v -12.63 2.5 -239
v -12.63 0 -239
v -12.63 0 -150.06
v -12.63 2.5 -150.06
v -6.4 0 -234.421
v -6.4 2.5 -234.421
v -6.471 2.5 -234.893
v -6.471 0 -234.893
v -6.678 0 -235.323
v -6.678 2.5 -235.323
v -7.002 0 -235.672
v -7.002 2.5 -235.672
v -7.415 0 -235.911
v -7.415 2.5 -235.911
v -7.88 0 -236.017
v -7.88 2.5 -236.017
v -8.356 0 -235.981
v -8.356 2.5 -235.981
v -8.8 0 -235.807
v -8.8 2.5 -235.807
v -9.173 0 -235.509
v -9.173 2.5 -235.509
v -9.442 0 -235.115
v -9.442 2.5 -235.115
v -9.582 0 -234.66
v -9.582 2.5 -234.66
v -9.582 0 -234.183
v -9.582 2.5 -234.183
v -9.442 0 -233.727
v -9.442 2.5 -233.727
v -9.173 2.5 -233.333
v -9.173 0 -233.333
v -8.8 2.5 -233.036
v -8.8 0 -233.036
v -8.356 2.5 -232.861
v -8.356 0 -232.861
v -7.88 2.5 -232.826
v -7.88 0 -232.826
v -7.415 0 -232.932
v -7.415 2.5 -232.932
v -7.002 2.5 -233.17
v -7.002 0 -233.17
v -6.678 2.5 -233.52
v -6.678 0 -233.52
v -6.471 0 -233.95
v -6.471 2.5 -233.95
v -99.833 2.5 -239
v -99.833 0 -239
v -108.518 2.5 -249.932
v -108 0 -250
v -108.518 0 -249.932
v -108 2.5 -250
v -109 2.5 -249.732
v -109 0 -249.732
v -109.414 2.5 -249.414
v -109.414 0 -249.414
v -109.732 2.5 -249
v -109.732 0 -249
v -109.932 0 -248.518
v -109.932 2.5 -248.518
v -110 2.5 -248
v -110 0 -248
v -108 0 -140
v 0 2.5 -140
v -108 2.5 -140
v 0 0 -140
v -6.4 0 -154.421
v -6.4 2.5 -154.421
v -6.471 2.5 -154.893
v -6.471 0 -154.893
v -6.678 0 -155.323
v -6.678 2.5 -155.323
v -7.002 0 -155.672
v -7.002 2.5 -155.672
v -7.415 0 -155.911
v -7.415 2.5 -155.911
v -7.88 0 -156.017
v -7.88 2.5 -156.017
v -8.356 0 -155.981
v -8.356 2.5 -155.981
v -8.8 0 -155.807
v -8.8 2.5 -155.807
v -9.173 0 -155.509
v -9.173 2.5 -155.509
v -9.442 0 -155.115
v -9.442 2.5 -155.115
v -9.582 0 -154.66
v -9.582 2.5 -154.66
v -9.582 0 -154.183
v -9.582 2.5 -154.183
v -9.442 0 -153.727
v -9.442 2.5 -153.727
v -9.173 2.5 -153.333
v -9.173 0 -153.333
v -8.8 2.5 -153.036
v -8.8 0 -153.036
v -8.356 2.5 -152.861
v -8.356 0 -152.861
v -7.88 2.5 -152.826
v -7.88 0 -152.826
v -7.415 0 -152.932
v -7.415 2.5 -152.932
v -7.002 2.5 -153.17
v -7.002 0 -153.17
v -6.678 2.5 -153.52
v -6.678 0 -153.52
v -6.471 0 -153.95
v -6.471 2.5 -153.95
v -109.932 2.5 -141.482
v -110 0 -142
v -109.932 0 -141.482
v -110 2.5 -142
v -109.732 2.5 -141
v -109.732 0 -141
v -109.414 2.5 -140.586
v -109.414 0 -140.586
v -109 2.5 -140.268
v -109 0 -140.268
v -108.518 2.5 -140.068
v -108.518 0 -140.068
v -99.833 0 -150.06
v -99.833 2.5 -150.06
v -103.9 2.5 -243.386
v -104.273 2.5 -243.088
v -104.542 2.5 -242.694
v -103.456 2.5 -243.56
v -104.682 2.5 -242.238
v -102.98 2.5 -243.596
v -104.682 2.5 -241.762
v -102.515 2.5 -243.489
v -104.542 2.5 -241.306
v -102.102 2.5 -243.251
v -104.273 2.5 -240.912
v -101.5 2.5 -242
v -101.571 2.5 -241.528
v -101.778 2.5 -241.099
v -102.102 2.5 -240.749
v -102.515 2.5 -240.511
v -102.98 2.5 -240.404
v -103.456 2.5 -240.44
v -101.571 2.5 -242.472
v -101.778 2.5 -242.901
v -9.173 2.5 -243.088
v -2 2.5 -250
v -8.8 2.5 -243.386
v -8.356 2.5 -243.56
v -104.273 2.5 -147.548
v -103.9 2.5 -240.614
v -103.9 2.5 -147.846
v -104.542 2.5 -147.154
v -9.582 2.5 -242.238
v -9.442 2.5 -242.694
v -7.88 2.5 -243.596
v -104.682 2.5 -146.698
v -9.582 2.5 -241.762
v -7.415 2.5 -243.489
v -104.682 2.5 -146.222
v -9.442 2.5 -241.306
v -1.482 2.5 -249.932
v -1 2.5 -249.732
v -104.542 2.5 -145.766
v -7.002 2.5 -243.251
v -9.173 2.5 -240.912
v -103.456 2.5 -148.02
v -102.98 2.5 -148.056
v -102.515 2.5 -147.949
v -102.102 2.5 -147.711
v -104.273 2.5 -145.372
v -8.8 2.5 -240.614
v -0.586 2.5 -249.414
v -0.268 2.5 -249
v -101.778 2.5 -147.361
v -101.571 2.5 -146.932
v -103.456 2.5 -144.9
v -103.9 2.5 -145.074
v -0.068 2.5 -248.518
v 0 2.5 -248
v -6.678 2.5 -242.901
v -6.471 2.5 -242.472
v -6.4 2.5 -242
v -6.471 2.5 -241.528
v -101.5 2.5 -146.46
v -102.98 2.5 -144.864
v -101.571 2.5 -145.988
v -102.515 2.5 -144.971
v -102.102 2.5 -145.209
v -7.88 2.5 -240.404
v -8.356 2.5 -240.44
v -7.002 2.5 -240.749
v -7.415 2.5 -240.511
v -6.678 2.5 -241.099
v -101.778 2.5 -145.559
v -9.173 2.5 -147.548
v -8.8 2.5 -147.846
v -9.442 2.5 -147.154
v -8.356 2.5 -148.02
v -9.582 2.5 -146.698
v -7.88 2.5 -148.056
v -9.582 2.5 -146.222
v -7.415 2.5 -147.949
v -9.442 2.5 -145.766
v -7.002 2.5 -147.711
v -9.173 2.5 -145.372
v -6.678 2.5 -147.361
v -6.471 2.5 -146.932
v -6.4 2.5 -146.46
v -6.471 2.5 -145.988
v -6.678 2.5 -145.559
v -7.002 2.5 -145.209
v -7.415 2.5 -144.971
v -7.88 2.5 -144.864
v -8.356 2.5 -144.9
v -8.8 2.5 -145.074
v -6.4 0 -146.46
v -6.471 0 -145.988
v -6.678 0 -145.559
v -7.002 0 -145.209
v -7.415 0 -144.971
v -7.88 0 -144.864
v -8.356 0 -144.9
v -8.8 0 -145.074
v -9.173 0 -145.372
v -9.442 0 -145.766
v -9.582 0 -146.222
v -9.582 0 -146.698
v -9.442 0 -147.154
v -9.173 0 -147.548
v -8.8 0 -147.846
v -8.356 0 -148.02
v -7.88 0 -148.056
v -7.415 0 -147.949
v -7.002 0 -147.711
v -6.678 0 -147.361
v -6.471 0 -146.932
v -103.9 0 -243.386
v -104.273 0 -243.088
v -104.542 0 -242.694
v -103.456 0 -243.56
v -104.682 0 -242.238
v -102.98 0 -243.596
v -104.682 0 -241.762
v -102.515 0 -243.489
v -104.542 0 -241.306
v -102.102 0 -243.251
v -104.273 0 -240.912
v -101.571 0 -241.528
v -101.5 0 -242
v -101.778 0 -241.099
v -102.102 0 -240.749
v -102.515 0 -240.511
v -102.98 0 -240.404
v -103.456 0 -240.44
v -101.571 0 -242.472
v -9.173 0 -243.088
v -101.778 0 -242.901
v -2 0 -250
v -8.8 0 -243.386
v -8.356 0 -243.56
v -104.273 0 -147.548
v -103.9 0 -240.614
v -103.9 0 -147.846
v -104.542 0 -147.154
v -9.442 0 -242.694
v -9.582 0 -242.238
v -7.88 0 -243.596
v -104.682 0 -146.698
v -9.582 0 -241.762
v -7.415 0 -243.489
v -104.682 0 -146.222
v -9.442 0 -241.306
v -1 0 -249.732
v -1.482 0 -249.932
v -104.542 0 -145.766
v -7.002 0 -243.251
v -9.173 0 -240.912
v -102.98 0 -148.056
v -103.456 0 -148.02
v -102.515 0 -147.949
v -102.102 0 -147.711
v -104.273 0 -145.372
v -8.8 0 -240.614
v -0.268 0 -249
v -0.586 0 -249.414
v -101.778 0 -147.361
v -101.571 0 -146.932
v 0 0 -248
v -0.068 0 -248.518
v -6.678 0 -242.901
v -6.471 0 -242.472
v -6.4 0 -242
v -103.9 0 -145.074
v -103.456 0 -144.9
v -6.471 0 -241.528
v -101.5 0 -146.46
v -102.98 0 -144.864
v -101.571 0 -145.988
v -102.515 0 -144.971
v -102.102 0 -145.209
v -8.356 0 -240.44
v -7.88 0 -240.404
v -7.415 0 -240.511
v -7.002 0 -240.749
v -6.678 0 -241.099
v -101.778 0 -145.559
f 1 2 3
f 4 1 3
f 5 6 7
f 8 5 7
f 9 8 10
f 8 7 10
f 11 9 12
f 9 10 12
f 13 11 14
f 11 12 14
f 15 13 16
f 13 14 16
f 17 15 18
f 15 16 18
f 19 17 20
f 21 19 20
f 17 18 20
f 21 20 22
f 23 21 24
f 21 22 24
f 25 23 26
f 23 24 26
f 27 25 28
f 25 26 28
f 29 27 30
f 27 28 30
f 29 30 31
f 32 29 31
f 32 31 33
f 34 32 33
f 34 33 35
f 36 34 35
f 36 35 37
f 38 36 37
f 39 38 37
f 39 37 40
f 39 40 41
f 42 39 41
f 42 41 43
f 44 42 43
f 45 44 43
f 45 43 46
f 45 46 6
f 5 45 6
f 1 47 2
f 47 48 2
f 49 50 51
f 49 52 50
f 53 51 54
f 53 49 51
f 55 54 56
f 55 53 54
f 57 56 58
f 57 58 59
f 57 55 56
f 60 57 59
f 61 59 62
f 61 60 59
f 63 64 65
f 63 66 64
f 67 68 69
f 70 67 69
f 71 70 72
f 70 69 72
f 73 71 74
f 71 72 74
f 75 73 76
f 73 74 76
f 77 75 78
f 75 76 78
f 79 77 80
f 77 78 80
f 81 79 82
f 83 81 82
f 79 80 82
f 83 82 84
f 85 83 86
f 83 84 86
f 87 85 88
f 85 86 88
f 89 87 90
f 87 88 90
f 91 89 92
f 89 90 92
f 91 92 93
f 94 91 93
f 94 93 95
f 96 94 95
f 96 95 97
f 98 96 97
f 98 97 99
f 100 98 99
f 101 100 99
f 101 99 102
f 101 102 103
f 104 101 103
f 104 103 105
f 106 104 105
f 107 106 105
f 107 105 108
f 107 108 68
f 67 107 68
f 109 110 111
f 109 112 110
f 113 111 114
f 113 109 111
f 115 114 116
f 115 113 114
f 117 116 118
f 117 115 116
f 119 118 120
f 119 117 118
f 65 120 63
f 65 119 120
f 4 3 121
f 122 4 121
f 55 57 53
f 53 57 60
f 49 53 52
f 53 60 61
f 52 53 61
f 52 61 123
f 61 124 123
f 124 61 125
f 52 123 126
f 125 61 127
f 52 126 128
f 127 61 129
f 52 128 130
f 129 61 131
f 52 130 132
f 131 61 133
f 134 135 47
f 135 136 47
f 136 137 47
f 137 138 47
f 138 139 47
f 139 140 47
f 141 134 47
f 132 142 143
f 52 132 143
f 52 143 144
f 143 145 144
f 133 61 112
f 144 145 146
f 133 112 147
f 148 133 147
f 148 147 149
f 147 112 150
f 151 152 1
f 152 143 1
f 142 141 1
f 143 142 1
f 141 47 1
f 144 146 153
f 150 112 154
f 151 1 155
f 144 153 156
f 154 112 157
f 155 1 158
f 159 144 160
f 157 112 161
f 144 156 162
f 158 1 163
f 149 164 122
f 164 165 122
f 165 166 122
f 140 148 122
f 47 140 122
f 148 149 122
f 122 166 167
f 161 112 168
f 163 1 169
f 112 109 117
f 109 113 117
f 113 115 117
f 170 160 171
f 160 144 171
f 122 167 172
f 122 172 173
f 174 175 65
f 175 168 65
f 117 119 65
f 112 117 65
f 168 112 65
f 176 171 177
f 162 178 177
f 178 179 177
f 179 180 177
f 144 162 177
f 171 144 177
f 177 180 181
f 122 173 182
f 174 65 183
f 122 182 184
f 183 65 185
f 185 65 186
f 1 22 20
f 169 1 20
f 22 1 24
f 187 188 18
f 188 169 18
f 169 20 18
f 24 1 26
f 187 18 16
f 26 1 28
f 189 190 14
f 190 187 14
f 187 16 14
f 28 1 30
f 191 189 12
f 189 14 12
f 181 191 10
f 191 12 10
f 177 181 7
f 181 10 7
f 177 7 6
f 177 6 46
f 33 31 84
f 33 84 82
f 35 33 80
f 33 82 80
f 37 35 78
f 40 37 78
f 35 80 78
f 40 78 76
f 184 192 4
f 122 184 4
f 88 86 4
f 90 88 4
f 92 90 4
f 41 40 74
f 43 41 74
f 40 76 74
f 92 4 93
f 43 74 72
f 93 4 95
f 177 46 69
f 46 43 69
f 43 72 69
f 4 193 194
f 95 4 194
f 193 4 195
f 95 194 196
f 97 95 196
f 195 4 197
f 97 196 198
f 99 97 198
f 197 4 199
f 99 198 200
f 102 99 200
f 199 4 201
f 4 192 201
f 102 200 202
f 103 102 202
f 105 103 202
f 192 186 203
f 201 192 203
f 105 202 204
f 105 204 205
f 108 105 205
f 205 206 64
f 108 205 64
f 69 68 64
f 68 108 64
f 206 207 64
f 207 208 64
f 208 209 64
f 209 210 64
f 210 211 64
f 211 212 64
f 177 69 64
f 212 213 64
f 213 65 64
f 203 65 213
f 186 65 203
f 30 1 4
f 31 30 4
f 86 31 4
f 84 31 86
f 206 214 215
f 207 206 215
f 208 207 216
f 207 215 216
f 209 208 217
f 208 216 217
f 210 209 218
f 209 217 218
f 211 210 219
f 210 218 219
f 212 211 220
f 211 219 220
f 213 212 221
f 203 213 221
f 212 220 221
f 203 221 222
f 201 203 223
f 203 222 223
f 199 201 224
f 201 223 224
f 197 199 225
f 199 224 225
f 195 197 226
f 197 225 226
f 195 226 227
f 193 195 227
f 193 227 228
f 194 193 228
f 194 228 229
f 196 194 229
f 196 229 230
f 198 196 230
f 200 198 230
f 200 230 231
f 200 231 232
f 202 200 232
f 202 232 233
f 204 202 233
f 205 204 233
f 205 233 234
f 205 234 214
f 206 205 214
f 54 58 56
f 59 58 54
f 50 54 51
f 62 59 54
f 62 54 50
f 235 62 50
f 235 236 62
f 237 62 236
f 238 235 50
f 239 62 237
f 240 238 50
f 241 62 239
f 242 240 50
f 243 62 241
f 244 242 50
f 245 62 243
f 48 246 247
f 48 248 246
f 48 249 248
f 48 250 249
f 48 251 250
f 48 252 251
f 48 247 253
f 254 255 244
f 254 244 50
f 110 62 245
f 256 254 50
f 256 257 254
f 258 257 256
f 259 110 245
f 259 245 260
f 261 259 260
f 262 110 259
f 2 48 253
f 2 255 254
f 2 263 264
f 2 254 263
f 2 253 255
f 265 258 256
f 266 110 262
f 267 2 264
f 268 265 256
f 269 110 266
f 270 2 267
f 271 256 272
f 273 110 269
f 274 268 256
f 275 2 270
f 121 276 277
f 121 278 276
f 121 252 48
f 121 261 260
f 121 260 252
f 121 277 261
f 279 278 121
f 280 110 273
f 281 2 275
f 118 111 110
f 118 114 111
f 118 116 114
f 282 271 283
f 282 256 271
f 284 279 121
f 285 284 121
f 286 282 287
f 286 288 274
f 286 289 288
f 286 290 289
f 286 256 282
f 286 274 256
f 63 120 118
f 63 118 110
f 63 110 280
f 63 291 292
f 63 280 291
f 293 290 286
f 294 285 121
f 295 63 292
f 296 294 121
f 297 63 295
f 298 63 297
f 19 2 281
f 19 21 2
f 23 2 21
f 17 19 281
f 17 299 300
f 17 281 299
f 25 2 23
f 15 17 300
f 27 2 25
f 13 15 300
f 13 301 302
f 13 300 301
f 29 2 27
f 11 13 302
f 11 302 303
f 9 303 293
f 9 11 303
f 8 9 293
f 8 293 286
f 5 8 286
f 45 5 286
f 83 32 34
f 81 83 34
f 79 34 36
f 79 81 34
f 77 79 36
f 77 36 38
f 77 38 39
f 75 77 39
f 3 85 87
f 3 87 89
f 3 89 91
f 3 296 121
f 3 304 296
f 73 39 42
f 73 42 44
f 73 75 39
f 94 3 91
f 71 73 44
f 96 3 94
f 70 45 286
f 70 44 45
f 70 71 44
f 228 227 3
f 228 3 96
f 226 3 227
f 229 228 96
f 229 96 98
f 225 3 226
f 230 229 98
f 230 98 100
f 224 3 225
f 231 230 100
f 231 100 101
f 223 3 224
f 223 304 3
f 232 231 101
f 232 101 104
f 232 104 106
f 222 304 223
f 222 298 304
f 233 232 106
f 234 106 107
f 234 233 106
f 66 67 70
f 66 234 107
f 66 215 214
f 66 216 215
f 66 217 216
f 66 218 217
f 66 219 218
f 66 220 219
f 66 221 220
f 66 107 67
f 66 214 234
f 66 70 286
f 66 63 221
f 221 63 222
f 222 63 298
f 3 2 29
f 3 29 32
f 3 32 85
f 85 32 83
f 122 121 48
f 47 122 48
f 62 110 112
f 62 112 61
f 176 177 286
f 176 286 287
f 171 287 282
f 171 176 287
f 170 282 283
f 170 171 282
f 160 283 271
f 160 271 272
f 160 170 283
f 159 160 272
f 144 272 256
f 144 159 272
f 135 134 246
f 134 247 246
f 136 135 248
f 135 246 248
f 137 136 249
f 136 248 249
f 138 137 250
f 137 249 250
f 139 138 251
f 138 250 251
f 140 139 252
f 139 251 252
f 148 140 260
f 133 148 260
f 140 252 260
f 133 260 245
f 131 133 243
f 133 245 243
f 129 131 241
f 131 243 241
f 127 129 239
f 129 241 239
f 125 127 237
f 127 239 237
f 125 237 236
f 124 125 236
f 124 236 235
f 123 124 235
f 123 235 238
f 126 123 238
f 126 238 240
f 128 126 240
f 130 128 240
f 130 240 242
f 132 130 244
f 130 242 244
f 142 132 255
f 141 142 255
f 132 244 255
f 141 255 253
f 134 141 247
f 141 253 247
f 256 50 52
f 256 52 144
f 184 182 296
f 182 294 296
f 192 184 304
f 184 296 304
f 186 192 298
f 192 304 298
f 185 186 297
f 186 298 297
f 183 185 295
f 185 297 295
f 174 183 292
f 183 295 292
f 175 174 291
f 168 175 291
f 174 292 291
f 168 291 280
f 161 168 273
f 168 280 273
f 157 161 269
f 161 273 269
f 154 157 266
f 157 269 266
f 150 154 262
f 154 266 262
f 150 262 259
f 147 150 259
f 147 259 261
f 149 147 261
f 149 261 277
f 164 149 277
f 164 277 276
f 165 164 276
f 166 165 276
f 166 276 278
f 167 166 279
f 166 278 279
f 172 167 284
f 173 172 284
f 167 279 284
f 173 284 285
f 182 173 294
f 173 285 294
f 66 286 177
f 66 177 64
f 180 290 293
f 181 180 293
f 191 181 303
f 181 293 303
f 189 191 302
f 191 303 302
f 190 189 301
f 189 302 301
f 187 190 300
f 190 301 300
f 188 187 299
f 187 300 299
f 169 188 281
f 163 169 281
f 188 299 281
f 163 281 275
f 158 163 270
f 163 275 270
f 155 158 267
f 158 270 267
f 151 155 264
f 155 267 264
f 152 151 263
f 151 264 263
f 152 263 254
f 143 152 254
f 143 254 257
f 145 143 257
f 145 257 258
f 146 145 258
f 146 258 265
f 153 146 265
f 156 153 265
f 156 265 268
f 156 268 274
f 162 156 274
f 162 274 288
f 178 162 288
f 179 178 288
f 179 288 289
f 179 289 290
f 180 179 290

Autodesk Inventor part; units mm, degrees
ref_plane "YZ Plane" through (0, 0, 0) normal (1, 0, 0) x (0, 1, 0)
ref_plane "XZ Plane" through (0, 0, 0) normal (0, 1, 0) x (-1, 0, 0)
ref_plane "XY Plane" through (0, 0, 0) normal (0, 0, 1) x (1, 0, 0)
sketch "草图1" plane through (0, 0, 0) normal (0, 1, 0) x (-1, 0, 0)
  line L0 (0, 0) -> (60, 0)
  line L1 (60, 0) -> (60, -140)
  line L2 (60, -140) -> (0, -140)
  line L3 (0, -140) -> (0, 0)
  dimension "d0" = 60
  dimension "d1" = 140
extrude "拉伸1" add sketch "草图1" along normal blind 2.5
sketch "草图2" plane through (0, 2.5, 0) normal (0, 1, 0) x (1, 0, 0)
  line L0 (0, 140) -> (-60, 140) projected
  line L1 (-60, 140) -> (-60, 0) projected
  line L2 (-60, 0) -> (0, 0) projected
  line L3 (0, 0) -> (0, 140) projected
  line L4 (-60, 0) -> (0, 0) projected
  line L5 (-30, 0) -> (-30, 146.6003)
  line L6 (-30, 8.9185) -> (-51, 8.9185)
  line L7 (-51, 8.9185) -> (-51, 50.9185)
  line L8 (-51, 50.9185) -> (-30, 50.9185)
  line L9 (-30, 50.9185) -> (-30, 8.9185)
  line L10 (-30, 8.9185) -> (-9, 8.9185)
  line L11 (-9, 8.9185) -> (-9, 50.9185)
  line L12 (-9, 50.9185) -> (-30, 50.9185)
  circle A0 centre (-45.5, 14.4185) radius 2.9433
  line L13 (-51, 29.9185) -> (-35.5931, 29.9185)
  circle A1 centre (-45.5, 45.4185) radius 2.9433
  circle A2 centre (-14.5, 14.4185) radius 2.9433
  circle A3 centre (-14.5, 45.4185) radius 2.9433
  circle A4 centre (-30, 29.9185) radius 2.55
  circle A5 centre (-30, 29.9185) radius 11.25
  dimension "d4" = 21
  dimension "d5" = 42
  dimension "d6" = 31
  dimension "d7" = 31
  dimension "d12" = 5.1
  dimension "d15" = 22.5
extrude "拉伸4" cut sketch "草图2" along normal mid plane 10 contours A4 L5 | L5 A4
extrude "拉伸5" cut sketch "草图2" against normal blind 10 contours A5 L5 A4 | L5 A4 A5 | A4 L5 | L5 A4
extrude "拉伸6" cut sketch "草图2" against normal blind 10 contours A5 L5 A4 | L5 A4 A5 | A4 L5 | L5 A4
sketch "草图6" plane through (0, 0, 0) normal (0, -1, 0) x (1, 0, 0)
  line L0 (-9, -8.9185) -> (-51, -8.9185) projected
  circle A0 centre (-30, -29.9185) radius 2.55 projected
  line L1 (-30, -29.9185) -> (-26.8, -29.9185)
  line L2 (-26.8, -29.9185) -> (-26.8, -111.9185)
  line L3 (-30, -29.9185) -> (-30, -39.9264)
  line L4 (-30, -29.9185) -> (-33.2, -29.9185)
  line L5 (-33.2, -29.9185) -> (-33.2, -111.9185)
  line L6 (-26.8, -111.9185) -> (-31.6, -111.9185)
  line L7 (-31.6, -111.9185) -> (-33.2, -111.9185)
  line L8 (-26.8, -111.9185) -> (-33.2, -111.9185)
  line L9 (-33.2, -111.9185) -> (-33.2, -115.1185)
  line L10 (-33.2, -115.1185) -> (-26.8, -115.1185)
  line L11 (-26.8, -115.1185) -> (-26.8, -111.9185)
  point P0 (0, 0)
  dimension "d20" = 3.2
  dimension "d21" = 82
  dimension "d22" = 3.2
extrude "拉伸7" add sketch "草图6" along normal blind 105 contours L11 L10 L9 L7 L6
sketch "草图7" plane through (-33.2, 0, -111.9185) normal (0, 0, 1) x (1, 0, 0)
  line L0 (0, 0) -> (6.4, 0) projected
  line L1 (0, 0) -> (0, -105) projected
  line L2 (6.4, -105) -> (0, -105) projected
  line L3 (6.4, 0) -> (6.4, -105) projected
  line L4 (6.4, 0) -> (6.4, -105) projected
  line L5 (0, 0) -> (0, -105) projected
  line L6 (6.4, -105) -> (0, -105)
  line L7 (0, -105) -> (0, -101.5)
  line L8 (0, -101.5) -> (6.4, -101.5)
  line L9 (6.4, -101.5) -> (6.4, -105)
  point P0 (33.2, 0)
  dimension "d25" = 3.5
sketch "草图8" plane through (0, -105, 0) normal (0, -1, 0) x (1, 0, 0)
  line L0 (-26.8, -111.9185) -> (-26.8, -115.1185) projected
  line L1 (-26.8, -115.1185) -> (-33.2, -115.1185) projected
  line L2 (-33.2, -115.1185) -> (-33.2, -111.9185) projected
  line L3 (-33.2, -111.9185) -> (-26.8, -111.9185) projected
  circle A0 centre (-30, -29.9185) radius 11.25 projected
  line L4 (0, -140) -> (-60, -140) projected
  line L5 (0, 0) -> (0, -140) projected
  line L6 (-60, 0) -> (0, 0) projected
  line L7 (-60, -140) -> (-60, 0) projected
  line L8 (-26.8, -111.9185) -> (-26.8, -29.9185)
  line L9 (-26.8, -29.9185) -> (-33.2, -29.9185)
  line L10 (-33.2, -29.9185) -> (-33.2, -111.9185)
  line L11 (-33.2, -111.9185) -> (-26.8, -111.9185)
  line L12 (-26.8, -111.9185) -> (-26.8, -29.9185)
  circle A1 centre (-30, -29.9185) radius 3.2
  line L13 (-26.8, -29.9185) -> (-26.8, -14.9185)
  line L14 (-26.8, -14.9185) -> (-33.2, -14.9185)
  line L15 (-33.2, -14.9185) -> (-33.2, -29.9185)
  circle A2 centre (-30, -29.9185) radius 2.55 projected
  line L16 (-26.8, -14.9185) -> (-26.8, -25.4185)
  line L17 (-26.8, -25.4185) -> (-33.2, -25.4185)
  dimension "d26" = 15
  dimension "d40" = 10.5
extrude "拉伸8" add sketch "草图8" against normal blind 3.5 contours L3 L10 A0 L8 | A0 L10 A1 L8 | A1 L9 A2 | L9 A2 A1 | A1 L15 L17 L13 | L15 L14 L13 A0 | A0 L13 L17 L15
sketch "草图10" plane through (0, -105, 0) normal (0, -1, 0) x (1, 0, 0)
  line L0 (-26.8, -111.9185) -> (-26.8, -115.1185) projected
  line L1 (-26.8, -115.1185) -> (-33.2, -115.1185) projected
  line L2 (-33.2, -115.1185) -> (-33.2, -111.9185) projected
  line L3 (-33.2, -111.9185) -> (-26.8, -111.9185) projected
  circle A0 centre (-30, -29.9185) radius 11.25 projected
  line L4 (0, -140) -> (-60, -140) projected
  line L5 (0, 0) -> (0, -140) projected
  line L6 (-60, 0) -> (0, 0) projected
  line L7 (-60, -140) -> (-60, 0) projected
  circle A1 centre (-30, -29.9185) radius 2.55 projected
  line L8 (-33.2, -14.9185) -> (-33.2, -115.1185) projected
  line L9 (-33.2, -115.1185) -> (-26.8, -115.1185) projected
  line L10 (-26.8, -115.1185) -> (-26.8, -14.9185) projected
  line L11 (-26.8, -14.9185) -> (-33.2, -14.9185) projected
  circle A2 centre (-30, -29.9185) radius 3.05
  point P0 (-33.2, -19.1332)
  point P1 (-26.8, -19.1332)
  dimension "d31" = 6.1
extrude "拉伸9" add sketch "草图10" against normal up to surface (105 mm away) contours A0 L8 L11 L10
extrude "拉伸10" cut sketch "草图10" against normal up to surface (3.5 mm away) contours A2
sketch "草图11" plane through (-33.2, -105, -115.1185) normal (-1, 0, 0) x (0, 0, 1)
  line L0 (3.2, 3.5) -> (95.9853, 3.5) projected
  line L1 (3.2, 105) -> (3.2, 3.5) projected
  line L2 (0, 105) -> (3.2, 105) projected
  line L3 (0, 105) -> (0, 0) projected
  line L4 (100.2, 0) -> (0, 0) projected
  line L5 (100.2, 0) -> (100.2, 105) projected
  line L6 (95.9853, 105) -> (100.2, 105) projected
  line L7 (95.9853, 3.5) -> (95.9853, 105) projected
  point P0 (115.1185, 105)
extrude "拉伸11" add sketch "草图11" along normal blind 1
sketch "草图12" plane through (0, 0, 0) normal (0, -1, 0) x (1, 0, 0)
  point P0 (0, 0)
extrude "拉伸12" add sketch "草图2" against normal up to surface (2.5 mm away) contours A5 L5 A4 | L5 A4 A5
sketch "草图13" plane through (-30, 2.5, -29.9185) normal (0, 1, 0) x (1, 0, 0)
  point P0 (30, -29.9185)
extrude "拉伸13" cut sketch "草图2" against normal blind 2 contours A5 L5 A4 | L5 A4 A5
sketch "草图14" plane through (0, -105, 0) normal (0, -1, 0) x (1, 0, 0)
  circle A0 centre (-30, -29.9185) radius 3.05 projected
  line L0 (-26.8, -115.1185) -> (-34.2, -115.1185) projected
  line L1 (-26.8, -14.9185) -> (-34.2, -14.9185) projected
  line L2 (-34.2, -115.1185) -> (-34.2, -14.9185) projected
  line L3 (-34.2, -115.1185) -> (-34.2, -14.9185) projected
  line L4 (-34.2, -19.1332) -> (-34.2, -14.9185) projected
  line L5 (-34.2, -19.1332) -> (-34.2, -111.9185) projected
  line L6 (-34.2, -115.1185) -> (-34.2, -111.9185) projected
  line L7 (-33.2, -19.1332) -> (-34.2, -19.1332) projected
  line L8 (-34.2, -19.1332) -> (-25.8, -19.1332)
  line L9 (-25.8, -115.1185) -> (-25.8, -14.9185) projected
  line L10 (-26.8, -115.1185) -> (-26.8, -14.9185) projected
  point P0 (0, 0)
  point P1 (-26.8, -19.1332)
extrude "拉伸14" cut sketch "草图14" against normal up to surface (105 mm away) contours L8 L7 L2 L1 L10
sketch "草图15" plane through (0, -101.5, 0) normal (0, 1, 0) x (1, 0, 0)
  line L0 (-34.2, 111.9185) -> (-26.8, 111.9185) projected
  line L1 (-34.2, 19.1332) -> (-34.2, 111.9185) projected
  circle A0 centre (-30, 29.9185) radius 3.05 projected
  line L2 (-26.8, 25.4185) -> (-33.2, 25.4185) projected
  line L3 (-26.8, 14.9185) -> (-26.8, 25.4185) projected
  line L4 (-34.2, 19.1332) -> (-26.8, 19.1332) projected
  line L5 (-26.8, 19.1332) -> (-26.8, 111.9185) projected
  point P0 (0, 0)
sketch "草图16" plane through (0, -105, 0) normal (0, -1, 0) x (1, 0, 0)
  line L0 (-26.8, -25.4185) -> (-33.2, -25.4185) projected
  line L1 (-34.2, -115.1185) -> (-34.2, -19.1332) projected
  line L2 (-26.8, -115.1185) -> (-34.2, -115.1185) projected
  circle A0 centre (-30, -29.9185) radius 3.05 projected
  line L3 (-26.8, -19.1332) -> (-34.2, -19.1332) projected
  line L4 (-26.8, -115.1185) -> (-26.8, -19.1332) projected
  point P0 (0, 0)
sketch "草图17" plane through (0, -101.5, 0) normal (0, 1, 0) x (1, 0, 0)
  line L0 (-25.8, 19.1332) -> (-34.2, 19.1332) projected
  line L1 (-25.8, 19.1332) -> (-25.8, 111.9185) projected
  line L2 (-34.2, 19.1332) -> (-25.8, 19.1332)
  line L3 (-25.8, 19.1332) -> (-25.8, 25.4182)
  line L4 (-25.8, 25.4182) -> (-34.2, 25.4182)
  line L5 (-34.2, 25.4182) -> (-34.2, 19.1332)
  point P0 (0, 0)
  dimension "d43" = 6.285
extrude "拉伸15" add sketch "草图17" along normal up to surface (101.5 mm away)
fillet "圆角1" radius 2 3 edges at (-34.2, -52.5, -19.1332) (-25.8, -50.75, -19.1332) (-34.2, -52.5, -115.1185)
sketch "草图18" plane through (0, 2.5, 0) normal (0, 1, 0) x (1, 0, 0)
  circle A0 centre (-30, 29.9185) radius 11.25 projected
  line L0 (0, 140) -> (-60, 140) projected
  line L1 (-60, 140) -> (-60, 0) projected
  line L2 (-60, 0) -> (0, 0) projected
  line L3 (0, 0) -> (0, 140) projected
  circle A1 centre (-45.5, 14.4185) radius 2.5
  line L4 (-30, 29.9185) -> (-30, 12.6275)
  circle A2 centre (-45.5, 45.4185) radius 2.5
  point P0 (-14.5, 14.4185)
  dimension "d47" = 5
  dimension "d48" = 5
extrude "拉伸16" cut sketch "草图18" against normal blind 10 contours A1 | A2
ref_plane "工作平面2" through (-30, 0, -140) normal (-1, 0, 0) x (0, 0, 1)
mirror "镜像2" about plane through (-30, 0, -140) normal (-1, 0, 0) of "拉伸16"
sketch "草图19" plane through (0, 0, 0) normal (0, -1, 0) x (1, 0, 0)
  line L0 (0, -140) -> (-60, -140) projected
  line L1 (0, -140) -> (-110, -140)
  line L2 (-110, -140) -> (-110, -250)
  line L3 (-110, -250) -> (0, -250)
  line L4 (0, -250) -> (0, -140)
  circle A0 centre (-8, -146.46) radius 1.6
  circle A1 centre (-8, -242) radius 1.6
  circle A2 centre (-103.1, -146.46) radius 1.6
  circle A3 centre (-103.1, -242) radius 1.6
  point P0 (0, 0)
  dimension "d51" = 110
  dimension "d52" = 110
  dimension "d53" = 3.2
  dimension "d54" = 3.2
  dimension "d55" = 95.54
  dimension "d56" = 8
  dimension "d57" = 3.2
  dimension "d58" = 95.1
  dimension "d59" = 3.2
  dimension "d74" = 8
  dimension "d75" = 8
  dimension "d76" = 95.1
extrude "拉伸17" add sketch "草图19" against normal up to surface (2.5 mm away)
sketch "草图20" plane through (-25.8, -101.5, -25.4182) normal (1, 0, 0) x (0, 0, -1)
  line L0 (-4.285, 0) -> (-4.285, 101.5) projected
  line L1 (-4.285, 0) -> (0, 0) projected
  line L2 (0, 0) -> (0, 101.5) projected
  line L3 (-4.285, 101.5) -> (0, 101.5) projected
  line L4 (-4.285, 0) -> (-4.285, 101.5) projected
  line L5 (-4.285, 101.5) -> (-4.285, 85)
  line L6 (-4.285, 85) -> (0, 85)
  line L7 (0, 0) -> (0, 101.5) projected
  line L8 (-4.285, 85) -> (-8.285, 85)
  line L9 (-8.285, 85) -> (-8.285, 101.5)
  line L10 (114.5818, 101.5) -> (-25.4182, 101.5) projected
  line L11 (-6.285, 78.0536) -> (-14.0927, 78.0536)
  line L12 (-14.0927, 78.0536) -> (-14.0927, 101.5)
  line L13 (-6.285, 101.5) -> (-6.285, -3.5) projected
  point P0 (-6.285, 85)
  dimension "d62" = 16.5
  dimension "d63" = 4
extrude "拉伸18" cut sketch "草图20" along normal mid plane 20.75 contours L8 L13 L10 L0 | L0 L3 L2 L6 | L8 L9 L10 L13
extrude "拉伸19" add sketch "草图20" against normal blind 7.4 contours L13 L11 L12 L10 L9 L8
sketch "草图21" plane through (-25.8, -23.4464, -19.1332) normal (0, 0, -1) x (-1, 0, 0)
  line L0 (2, 6.9464) -> (2, 0) projected
  line L1 (0, 6.9464) -> (2, 6.9464) projected
  line L2 (0, 0) -> (0, 6.9464) projected
  line L3 (0, 0) -> (2, 0) projected
  line L4 (6.4, 0) -> (6.4, 6.9464) projected
  line L5 (6.4, 0) -> (7.4, 0) projected
  line L6 (7.4, 6.9464) -> (7.4, 0) projected
  line L7 (6.4, 6.9464) -> (7.4, 6.9464) projected
  point P0 (-25.8, 23.4464)
extrude "拉伸20" add sketch "草图21" along normal blind 2.5
fillet "圆角2" radius 2 3 edges at (-29.5, -23.4464, -11.3254) (-25.8, -11.7232, -11.3254) (-33.2, -11.7232, -11.3254)
sketch "草图22" plane through (0, -105, 0) normal (0, -1, 0) x (1, 0, 0)
  circle A0 centre (-30, -29.9185) radius 3.05 projected
  circle A1 centre (-30, -29.9185) radius 3.2 projected
  point P0 (0, 0)
sketch "草图23" plane through (0, -105, 0) normal (0, -1, 0) x (1, 0, 0)
  circle A0 centre (-30, -29.9185) radius 2.55 projected
  point P0 (0, 0)
sketch "草图24" plane through (0, -105, 0) normal (0, -1, 0) x (1, 0, 0)
  point P0 (0, 0)
sketch "草图25" plane through (0, -105, 0) normal (0, -1, 0) x (1, 0, 0)
  circle A0 centre (-30, -29.9185) radius 2.75
  point P0 (0, 0)
  dimension "d71" = 5.5
extrude "拉伸21" cut sketch "草图25" against normal blind 2.5
sketch "草图26" plane through (0, 0, 0) normal (1, 0, 0) x (0, 0, -1)
  point P0 (0, 0)
sketch "草图27" plane through (0, 2.5, 0) normal (0, 1, 0) x (1, 0, 0)
  circle A0 centre (-8, 146.46) radius 1.6 projected
  circle A1 centre (-8, 242) radius 1.6 projected
  circle A2 centre (-103.1, 146.46) radius 1.6 projected
  circle A3 centre (-103.1, 242) radius 1.6 projected
  circle A4 centre (-14.5, 14.4185) radius 2.5 projected
  circle A5 centre (-14.5, 45.4185) radius 2.5 projected
  circle A6 centre (-45.5, 14.4185) radius 2.5 projected
  circle A7 centre (-45.5, 45.4185) radius 2.5 projected
  circle A8 centre (-30, 29.9185) radius 11.25 projected
  line L0 (-60, 140) -> (-60, 0) projected
  line L1 (-60, 0) -> (0, 0) projected
  line L2 (0, 0) -> (0, 250) projected
  line L3 (-110, 250) -> (0, 250) projected
  line L4 (-110, 140) -> (-110, 250) projected
  line L5 (-60, 140) -> (-110, 140) projected
  circle A9 centre (-8, 154.4212) radius 1.6
  circle A10 centre (-8, 234.4212) radius 1.6
  dimension "d77" = 3.2
  dimension "d78" = 3.2
  dimension "d79" = 80
extrude "拉伸22" cut sketch "草图27" against normal up to surface (2.5 mm away) contours A9 | A10
sketch "草图28" plane through (0, 0, 0) normal (0, -1, 0) x (1, 0, 0)
  line L0 (-12.63, -150.06) -> (-99.8327, -150.06)
  line L1 (-99.8327, -150.06) -> (-99.8327, -239)
  line L2 (-99.8327, -239) -> (-12.63, -239)
  line L3 (-12.63, -239) -> (-12.63, -150.06)
  circle A0 centre (-8, -146.46) radius 1.6 projected
  circle A1 centre (-8, -242) radius 1.6 projected
  circle A2 centre (-8, -154.4212) radius 1.6 projected
  circle A3 centre (-8, -234.4212) radius 1.6 projected
  circle A4 centre (-8, -146.46) radius 1.6 projected
  circle A5 centre (-8, -242) radius 1.6 projected
  circle A6 centre (-103.1, -146.46) radius 1.6 projected
  circle A7 centre (-103.1, -242) radius 1.6 projected
  circle A8 centre (-14.5, -14.4185) radius 2.5 projected
  circle A9 centre (-14.5, -45.4185) radius 2.5 projected
  circle A10 centre (-45.5, -14.4185) radius 2.5 projected
  circle A11 centre (-45.5, -45.4185) radius 2.5 projected
  circle A12 centre (-30, -29.9185) radius 11.25 projected
  line L4 (-60, -140) -> (-60, 0) projected
  line L5 (-60, 0) -> (0, 0) projected
  line L6 (0, 0) -> (0, -250) projected
  line L7 (-110, -250) -> (0, -250) projected
  line L8 (-110, -140) -> (-110, -250) projected
  line L9 (-60, -140) -> (-110, -140) projected
  dimension "d82" = 3.6
  dimension "d83" = 3
extrude "拉伸23" cut sketch "草图28" against normal blind 10 contours L3 L2 L1 L0
fillet "圆角3" radius 2 5 edges at (-110, 1.25, -250) (0, 1.25, -250) (-110, 1.25, -140) (-60, 1.25, 0) (0, 1.25, 0)
sketch "草图29" plane through (0, 0, 0) normal (0, -1, 0) x (1, 0, 0)
  line L0 (-6, -56.5984) -> (-53, -56.5984)
  line L1 (-53, -56.5984) -> (-53, -105.9913)
  line L2 (-53, -105.9913) -> (-6, -105.9913)
  line L3 (-6, -105.9913) -> (-6, -56.5984)
  line L4 (-60, -140) -> (-60, -2) projected
  line L5 (0, -2) -> (0, -248) projected
  point P0 (0, 0)
  dimension "d87" = 7
  dimension "d88" = 6
extrude "拉伸24" cut sketch "草图29" against normal blind 10
extrude "拉伸25" cut sketch "草图8" along normal through all both and the other way through all contours L0 L1 L2 L3 | L3 L10 A0 L8 | L8 L13 A0 | A0 L10 A1 L8 | A0 L15 L10 | A1 L9 A2 | L9 A2 A1 | A1 L15 L17 L13 | L15 L14 L13 A0 | A0 L13 L17 L15 | A2 L9 | L9 A2 | L4 L7 L6 L5
properties part number "42底座1"
